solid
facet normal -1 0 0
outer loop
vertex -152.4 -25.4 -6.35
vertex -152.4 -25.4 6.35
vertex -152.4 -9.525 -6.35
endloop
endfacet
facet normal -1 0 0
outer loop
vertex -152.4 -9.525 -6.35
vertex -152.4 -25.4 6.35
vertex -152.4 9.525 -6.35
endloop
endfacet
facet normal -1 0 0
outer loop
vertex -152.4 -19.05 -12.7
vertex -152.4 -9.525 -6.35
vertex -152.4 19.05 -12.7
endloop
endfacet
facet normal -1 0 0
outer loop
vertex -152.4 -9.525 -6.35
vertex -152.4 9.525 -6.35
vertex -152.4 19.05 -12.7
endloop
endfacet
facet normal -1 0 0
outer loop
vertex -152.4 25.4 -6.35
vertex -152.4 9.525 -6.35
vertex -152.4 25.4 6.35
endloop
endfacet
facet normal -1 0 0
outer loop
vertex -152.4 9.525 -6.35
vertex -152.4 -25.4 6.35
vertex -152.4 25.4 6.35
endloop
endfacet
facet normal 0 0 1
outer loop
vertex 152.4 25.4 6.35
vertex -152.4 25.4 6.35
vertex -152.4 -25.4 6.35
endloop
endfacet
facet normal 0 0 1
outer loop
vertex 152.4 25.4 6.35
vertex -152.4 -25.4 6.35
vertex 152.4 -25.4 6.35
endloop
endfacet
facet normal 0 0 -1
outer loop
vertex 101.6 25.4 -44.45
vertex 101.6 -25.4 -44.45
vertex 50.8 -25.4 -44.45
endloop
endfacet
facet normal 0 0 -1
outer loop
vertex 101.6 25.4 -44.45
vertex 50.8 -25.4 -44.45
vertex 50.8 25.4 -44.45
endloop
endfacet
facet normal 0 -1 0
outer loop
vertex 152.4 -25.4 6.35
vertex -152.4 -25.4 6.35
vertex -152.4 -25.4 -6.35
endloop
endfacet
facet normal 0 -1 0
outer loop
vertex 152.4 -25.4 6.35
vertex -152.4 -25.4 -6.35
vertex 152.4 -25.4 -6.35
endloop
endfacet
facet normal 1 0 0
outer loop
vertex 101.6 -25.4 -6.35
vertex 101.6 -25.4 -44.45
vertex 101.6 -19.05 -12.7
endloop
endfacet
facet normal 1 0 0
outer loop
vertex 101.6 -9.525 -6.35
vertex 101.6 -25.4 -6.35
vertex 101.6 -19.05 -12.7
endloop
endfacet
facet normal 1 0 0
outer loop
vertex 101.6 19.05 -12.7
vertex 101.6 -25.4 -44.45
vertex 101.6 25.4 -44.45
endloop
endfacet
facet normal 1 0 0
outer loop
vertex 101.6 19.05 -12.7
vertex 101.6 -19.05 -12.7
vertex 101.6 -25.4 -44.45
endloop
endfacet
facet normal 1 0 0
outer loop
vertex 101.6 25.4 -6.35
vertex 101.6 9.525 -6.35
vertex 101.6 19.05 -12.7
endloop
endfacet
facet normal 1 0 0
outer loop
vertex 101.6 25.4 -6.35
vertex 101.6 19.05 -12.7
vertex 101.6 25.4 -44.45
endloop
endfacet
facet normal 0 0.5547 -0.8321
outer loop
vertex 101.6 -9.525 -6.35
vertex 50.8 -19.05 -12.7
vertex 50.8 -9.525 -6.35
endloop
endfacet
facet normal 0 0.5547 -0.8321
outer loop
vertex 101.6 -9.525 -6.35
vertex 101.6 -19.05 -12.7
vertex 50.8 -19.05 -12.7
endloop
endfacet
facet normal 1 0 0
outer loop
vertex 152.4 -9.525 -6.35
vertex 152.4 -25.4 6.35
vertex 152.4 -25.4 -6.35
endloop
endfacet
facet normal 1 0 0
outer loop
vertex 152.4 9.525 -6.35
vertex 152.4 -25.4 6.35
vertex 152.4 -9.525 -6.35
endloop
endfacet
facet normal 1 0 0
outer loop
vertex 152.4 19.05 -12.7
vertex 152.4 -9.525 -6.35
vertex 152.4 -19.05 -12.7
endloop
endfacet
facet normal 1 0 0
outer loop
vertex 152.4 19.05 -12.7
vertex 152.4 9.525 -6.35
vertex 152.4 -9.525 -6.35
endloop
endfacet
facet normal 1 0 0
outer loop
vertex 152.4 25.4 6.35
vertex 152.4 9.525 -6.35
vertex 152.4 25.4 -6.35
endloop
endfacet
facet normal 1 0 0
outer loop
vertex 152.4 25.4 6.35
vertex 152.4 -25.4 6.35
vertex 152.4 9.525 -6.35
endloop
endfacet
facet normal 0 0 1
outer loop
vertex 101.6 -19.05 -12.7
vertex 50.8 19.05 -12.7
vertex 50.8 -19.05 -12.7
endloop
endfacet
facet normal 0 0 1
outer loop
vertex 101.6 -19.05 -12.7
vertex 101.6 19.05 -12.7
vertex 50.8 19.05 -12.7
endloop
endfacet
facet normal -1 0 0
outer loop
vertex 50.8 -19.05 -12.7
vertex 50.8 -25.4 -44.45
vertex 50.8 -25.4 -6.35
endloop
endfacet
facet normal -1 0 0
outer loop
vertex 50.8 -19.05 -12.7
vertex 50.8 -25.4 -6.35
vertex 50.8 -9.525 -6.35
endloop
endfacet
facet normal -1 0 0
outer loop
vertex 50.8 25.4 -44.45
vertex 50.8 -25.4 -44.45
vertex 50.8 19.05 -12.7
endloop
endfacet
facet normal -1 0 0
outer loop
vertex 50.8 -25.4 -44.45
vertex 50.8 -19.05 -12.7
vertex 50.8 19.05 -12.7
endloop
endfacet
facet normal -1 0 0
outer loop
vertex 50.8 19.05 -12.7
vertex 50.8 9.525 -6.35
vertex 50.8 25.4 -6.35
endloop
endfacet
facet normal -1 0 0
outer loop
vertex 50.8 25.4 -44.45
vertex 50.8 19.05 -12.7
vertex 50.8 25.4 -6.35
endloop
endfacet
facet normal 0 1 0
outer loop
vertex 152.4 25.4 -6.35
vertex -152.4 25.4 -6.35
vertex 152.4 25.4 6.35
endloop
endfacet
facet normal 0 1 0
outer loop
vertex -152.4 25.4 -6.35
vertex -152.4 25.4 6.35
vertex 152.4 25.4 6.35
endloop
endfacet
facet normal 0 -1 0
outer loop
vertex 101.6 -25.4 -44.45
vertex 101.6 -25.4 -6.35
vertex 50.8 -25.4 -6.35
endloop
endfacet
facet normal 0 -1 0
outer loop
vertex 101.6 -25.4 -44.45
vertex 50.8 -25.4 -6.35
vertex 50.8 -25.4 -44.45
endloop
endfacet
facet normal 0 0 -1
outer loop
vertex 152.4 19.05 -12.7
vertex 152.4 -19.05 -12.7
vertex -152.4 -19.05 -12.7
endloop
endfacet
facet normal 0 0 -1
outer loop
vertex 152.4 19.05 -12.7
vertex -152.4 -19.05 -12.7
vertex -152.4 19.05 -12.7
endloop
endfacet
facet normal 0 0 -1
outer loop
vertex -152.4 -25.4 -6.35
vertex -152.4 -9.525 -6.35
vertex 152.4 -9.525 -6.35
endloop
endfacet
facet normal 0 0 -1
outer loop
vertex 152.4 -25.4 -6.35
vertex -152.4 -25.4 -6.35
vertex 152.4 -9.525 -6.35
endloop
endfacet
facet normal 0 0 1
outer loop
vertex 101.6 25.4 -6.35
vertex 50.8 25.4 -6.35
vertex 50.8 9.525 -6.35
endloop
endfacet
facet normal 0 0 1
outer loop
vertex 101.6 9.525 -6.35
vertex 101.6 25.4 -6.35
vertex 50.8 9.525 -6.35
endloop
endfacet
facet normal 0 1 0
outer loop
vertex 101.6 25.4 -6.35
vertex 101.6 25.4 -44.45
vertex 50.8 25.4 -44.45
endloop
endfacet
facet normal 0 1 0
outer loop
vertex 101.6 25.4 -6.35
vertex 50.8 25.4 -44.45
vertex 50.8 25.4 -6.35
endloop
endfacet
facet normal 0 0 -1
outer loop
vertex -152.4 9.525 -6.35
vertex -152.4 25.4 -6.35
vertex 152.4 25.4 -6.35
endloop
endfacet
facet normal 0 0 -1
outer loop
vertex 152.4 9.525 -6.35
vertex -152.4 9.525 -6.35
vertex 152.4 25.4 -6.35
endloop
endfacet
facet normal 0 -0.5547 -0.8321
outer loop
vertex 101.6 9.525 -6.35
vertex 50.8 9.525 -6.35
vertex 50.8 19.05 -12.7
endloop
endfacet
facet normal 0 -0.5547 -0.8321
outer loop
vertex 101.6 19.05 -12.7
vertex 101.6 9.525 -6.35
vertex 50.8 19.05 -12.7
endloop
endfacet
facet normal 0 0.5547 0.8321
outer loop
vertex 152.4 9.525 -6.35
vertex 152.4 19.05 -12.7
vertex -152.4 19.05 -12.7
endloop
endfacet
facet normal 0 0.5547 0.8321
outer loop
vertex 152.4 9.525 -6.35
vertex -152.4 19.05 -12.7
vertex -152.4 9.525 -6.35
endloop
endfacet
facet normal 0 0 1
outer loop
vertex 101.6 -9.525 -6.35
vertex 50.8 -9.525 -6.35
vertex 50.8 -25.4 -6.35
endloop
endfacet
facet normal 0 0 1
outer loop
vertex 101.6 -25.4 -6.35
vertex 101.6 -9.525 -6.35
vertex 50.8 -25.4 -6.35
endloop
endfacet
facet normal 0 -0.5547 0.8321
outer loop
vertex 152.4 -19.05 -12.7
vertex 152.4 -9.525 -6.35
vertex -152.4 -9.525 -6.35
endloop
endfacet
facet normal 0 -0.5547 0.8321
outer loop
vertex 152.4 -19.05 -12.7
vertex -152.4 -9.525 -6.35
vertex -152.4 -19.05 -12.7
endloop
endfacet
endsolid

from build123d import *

# Parameters (mm, degrees)
F0_W     = 304.8
F0_H     = 50.8
F1_DEPTH = 6.35
F3_DEPTH = 304.8
F6_DEPTH = 25.4


with BuildPart() as f1:
    # F0 (on Top) → F1 (new body, symmetric)
    with BuildSketch(Plane.XY):
        Rectangle(F0_W, F0_H)
    extrude(amount=F1_DEPTH, both=True)

    # F2 (on face) → F3 (join, through all)
    with BuildSketch(Plane.YZ.offset(152.4)):
        Polygon((9.525, -6.35), (-9.525, -6.35), (-19.05, -12.7), (19.05, -12.7), align=None)
    extrude(amount=-F3_DEPTH)


with BuildPart() as f6:
    # F5 (on offset) → F6 (new body, symmetric)
    with BuildSketch(Plane.YZ.offset(76.2)):
        Polygon((-19.05, -12.7), (-9.525, -6.35), (-25.4, -6.35), (-25.4, -44.45), (25.4, -44.45), (25.4, -6.35), (9.525, -6.35), (19.05, -12.7), align=None)
    extrude(amount=F6_DEPTH, both=True)


solid = Compound([f1.part, f6.part])
